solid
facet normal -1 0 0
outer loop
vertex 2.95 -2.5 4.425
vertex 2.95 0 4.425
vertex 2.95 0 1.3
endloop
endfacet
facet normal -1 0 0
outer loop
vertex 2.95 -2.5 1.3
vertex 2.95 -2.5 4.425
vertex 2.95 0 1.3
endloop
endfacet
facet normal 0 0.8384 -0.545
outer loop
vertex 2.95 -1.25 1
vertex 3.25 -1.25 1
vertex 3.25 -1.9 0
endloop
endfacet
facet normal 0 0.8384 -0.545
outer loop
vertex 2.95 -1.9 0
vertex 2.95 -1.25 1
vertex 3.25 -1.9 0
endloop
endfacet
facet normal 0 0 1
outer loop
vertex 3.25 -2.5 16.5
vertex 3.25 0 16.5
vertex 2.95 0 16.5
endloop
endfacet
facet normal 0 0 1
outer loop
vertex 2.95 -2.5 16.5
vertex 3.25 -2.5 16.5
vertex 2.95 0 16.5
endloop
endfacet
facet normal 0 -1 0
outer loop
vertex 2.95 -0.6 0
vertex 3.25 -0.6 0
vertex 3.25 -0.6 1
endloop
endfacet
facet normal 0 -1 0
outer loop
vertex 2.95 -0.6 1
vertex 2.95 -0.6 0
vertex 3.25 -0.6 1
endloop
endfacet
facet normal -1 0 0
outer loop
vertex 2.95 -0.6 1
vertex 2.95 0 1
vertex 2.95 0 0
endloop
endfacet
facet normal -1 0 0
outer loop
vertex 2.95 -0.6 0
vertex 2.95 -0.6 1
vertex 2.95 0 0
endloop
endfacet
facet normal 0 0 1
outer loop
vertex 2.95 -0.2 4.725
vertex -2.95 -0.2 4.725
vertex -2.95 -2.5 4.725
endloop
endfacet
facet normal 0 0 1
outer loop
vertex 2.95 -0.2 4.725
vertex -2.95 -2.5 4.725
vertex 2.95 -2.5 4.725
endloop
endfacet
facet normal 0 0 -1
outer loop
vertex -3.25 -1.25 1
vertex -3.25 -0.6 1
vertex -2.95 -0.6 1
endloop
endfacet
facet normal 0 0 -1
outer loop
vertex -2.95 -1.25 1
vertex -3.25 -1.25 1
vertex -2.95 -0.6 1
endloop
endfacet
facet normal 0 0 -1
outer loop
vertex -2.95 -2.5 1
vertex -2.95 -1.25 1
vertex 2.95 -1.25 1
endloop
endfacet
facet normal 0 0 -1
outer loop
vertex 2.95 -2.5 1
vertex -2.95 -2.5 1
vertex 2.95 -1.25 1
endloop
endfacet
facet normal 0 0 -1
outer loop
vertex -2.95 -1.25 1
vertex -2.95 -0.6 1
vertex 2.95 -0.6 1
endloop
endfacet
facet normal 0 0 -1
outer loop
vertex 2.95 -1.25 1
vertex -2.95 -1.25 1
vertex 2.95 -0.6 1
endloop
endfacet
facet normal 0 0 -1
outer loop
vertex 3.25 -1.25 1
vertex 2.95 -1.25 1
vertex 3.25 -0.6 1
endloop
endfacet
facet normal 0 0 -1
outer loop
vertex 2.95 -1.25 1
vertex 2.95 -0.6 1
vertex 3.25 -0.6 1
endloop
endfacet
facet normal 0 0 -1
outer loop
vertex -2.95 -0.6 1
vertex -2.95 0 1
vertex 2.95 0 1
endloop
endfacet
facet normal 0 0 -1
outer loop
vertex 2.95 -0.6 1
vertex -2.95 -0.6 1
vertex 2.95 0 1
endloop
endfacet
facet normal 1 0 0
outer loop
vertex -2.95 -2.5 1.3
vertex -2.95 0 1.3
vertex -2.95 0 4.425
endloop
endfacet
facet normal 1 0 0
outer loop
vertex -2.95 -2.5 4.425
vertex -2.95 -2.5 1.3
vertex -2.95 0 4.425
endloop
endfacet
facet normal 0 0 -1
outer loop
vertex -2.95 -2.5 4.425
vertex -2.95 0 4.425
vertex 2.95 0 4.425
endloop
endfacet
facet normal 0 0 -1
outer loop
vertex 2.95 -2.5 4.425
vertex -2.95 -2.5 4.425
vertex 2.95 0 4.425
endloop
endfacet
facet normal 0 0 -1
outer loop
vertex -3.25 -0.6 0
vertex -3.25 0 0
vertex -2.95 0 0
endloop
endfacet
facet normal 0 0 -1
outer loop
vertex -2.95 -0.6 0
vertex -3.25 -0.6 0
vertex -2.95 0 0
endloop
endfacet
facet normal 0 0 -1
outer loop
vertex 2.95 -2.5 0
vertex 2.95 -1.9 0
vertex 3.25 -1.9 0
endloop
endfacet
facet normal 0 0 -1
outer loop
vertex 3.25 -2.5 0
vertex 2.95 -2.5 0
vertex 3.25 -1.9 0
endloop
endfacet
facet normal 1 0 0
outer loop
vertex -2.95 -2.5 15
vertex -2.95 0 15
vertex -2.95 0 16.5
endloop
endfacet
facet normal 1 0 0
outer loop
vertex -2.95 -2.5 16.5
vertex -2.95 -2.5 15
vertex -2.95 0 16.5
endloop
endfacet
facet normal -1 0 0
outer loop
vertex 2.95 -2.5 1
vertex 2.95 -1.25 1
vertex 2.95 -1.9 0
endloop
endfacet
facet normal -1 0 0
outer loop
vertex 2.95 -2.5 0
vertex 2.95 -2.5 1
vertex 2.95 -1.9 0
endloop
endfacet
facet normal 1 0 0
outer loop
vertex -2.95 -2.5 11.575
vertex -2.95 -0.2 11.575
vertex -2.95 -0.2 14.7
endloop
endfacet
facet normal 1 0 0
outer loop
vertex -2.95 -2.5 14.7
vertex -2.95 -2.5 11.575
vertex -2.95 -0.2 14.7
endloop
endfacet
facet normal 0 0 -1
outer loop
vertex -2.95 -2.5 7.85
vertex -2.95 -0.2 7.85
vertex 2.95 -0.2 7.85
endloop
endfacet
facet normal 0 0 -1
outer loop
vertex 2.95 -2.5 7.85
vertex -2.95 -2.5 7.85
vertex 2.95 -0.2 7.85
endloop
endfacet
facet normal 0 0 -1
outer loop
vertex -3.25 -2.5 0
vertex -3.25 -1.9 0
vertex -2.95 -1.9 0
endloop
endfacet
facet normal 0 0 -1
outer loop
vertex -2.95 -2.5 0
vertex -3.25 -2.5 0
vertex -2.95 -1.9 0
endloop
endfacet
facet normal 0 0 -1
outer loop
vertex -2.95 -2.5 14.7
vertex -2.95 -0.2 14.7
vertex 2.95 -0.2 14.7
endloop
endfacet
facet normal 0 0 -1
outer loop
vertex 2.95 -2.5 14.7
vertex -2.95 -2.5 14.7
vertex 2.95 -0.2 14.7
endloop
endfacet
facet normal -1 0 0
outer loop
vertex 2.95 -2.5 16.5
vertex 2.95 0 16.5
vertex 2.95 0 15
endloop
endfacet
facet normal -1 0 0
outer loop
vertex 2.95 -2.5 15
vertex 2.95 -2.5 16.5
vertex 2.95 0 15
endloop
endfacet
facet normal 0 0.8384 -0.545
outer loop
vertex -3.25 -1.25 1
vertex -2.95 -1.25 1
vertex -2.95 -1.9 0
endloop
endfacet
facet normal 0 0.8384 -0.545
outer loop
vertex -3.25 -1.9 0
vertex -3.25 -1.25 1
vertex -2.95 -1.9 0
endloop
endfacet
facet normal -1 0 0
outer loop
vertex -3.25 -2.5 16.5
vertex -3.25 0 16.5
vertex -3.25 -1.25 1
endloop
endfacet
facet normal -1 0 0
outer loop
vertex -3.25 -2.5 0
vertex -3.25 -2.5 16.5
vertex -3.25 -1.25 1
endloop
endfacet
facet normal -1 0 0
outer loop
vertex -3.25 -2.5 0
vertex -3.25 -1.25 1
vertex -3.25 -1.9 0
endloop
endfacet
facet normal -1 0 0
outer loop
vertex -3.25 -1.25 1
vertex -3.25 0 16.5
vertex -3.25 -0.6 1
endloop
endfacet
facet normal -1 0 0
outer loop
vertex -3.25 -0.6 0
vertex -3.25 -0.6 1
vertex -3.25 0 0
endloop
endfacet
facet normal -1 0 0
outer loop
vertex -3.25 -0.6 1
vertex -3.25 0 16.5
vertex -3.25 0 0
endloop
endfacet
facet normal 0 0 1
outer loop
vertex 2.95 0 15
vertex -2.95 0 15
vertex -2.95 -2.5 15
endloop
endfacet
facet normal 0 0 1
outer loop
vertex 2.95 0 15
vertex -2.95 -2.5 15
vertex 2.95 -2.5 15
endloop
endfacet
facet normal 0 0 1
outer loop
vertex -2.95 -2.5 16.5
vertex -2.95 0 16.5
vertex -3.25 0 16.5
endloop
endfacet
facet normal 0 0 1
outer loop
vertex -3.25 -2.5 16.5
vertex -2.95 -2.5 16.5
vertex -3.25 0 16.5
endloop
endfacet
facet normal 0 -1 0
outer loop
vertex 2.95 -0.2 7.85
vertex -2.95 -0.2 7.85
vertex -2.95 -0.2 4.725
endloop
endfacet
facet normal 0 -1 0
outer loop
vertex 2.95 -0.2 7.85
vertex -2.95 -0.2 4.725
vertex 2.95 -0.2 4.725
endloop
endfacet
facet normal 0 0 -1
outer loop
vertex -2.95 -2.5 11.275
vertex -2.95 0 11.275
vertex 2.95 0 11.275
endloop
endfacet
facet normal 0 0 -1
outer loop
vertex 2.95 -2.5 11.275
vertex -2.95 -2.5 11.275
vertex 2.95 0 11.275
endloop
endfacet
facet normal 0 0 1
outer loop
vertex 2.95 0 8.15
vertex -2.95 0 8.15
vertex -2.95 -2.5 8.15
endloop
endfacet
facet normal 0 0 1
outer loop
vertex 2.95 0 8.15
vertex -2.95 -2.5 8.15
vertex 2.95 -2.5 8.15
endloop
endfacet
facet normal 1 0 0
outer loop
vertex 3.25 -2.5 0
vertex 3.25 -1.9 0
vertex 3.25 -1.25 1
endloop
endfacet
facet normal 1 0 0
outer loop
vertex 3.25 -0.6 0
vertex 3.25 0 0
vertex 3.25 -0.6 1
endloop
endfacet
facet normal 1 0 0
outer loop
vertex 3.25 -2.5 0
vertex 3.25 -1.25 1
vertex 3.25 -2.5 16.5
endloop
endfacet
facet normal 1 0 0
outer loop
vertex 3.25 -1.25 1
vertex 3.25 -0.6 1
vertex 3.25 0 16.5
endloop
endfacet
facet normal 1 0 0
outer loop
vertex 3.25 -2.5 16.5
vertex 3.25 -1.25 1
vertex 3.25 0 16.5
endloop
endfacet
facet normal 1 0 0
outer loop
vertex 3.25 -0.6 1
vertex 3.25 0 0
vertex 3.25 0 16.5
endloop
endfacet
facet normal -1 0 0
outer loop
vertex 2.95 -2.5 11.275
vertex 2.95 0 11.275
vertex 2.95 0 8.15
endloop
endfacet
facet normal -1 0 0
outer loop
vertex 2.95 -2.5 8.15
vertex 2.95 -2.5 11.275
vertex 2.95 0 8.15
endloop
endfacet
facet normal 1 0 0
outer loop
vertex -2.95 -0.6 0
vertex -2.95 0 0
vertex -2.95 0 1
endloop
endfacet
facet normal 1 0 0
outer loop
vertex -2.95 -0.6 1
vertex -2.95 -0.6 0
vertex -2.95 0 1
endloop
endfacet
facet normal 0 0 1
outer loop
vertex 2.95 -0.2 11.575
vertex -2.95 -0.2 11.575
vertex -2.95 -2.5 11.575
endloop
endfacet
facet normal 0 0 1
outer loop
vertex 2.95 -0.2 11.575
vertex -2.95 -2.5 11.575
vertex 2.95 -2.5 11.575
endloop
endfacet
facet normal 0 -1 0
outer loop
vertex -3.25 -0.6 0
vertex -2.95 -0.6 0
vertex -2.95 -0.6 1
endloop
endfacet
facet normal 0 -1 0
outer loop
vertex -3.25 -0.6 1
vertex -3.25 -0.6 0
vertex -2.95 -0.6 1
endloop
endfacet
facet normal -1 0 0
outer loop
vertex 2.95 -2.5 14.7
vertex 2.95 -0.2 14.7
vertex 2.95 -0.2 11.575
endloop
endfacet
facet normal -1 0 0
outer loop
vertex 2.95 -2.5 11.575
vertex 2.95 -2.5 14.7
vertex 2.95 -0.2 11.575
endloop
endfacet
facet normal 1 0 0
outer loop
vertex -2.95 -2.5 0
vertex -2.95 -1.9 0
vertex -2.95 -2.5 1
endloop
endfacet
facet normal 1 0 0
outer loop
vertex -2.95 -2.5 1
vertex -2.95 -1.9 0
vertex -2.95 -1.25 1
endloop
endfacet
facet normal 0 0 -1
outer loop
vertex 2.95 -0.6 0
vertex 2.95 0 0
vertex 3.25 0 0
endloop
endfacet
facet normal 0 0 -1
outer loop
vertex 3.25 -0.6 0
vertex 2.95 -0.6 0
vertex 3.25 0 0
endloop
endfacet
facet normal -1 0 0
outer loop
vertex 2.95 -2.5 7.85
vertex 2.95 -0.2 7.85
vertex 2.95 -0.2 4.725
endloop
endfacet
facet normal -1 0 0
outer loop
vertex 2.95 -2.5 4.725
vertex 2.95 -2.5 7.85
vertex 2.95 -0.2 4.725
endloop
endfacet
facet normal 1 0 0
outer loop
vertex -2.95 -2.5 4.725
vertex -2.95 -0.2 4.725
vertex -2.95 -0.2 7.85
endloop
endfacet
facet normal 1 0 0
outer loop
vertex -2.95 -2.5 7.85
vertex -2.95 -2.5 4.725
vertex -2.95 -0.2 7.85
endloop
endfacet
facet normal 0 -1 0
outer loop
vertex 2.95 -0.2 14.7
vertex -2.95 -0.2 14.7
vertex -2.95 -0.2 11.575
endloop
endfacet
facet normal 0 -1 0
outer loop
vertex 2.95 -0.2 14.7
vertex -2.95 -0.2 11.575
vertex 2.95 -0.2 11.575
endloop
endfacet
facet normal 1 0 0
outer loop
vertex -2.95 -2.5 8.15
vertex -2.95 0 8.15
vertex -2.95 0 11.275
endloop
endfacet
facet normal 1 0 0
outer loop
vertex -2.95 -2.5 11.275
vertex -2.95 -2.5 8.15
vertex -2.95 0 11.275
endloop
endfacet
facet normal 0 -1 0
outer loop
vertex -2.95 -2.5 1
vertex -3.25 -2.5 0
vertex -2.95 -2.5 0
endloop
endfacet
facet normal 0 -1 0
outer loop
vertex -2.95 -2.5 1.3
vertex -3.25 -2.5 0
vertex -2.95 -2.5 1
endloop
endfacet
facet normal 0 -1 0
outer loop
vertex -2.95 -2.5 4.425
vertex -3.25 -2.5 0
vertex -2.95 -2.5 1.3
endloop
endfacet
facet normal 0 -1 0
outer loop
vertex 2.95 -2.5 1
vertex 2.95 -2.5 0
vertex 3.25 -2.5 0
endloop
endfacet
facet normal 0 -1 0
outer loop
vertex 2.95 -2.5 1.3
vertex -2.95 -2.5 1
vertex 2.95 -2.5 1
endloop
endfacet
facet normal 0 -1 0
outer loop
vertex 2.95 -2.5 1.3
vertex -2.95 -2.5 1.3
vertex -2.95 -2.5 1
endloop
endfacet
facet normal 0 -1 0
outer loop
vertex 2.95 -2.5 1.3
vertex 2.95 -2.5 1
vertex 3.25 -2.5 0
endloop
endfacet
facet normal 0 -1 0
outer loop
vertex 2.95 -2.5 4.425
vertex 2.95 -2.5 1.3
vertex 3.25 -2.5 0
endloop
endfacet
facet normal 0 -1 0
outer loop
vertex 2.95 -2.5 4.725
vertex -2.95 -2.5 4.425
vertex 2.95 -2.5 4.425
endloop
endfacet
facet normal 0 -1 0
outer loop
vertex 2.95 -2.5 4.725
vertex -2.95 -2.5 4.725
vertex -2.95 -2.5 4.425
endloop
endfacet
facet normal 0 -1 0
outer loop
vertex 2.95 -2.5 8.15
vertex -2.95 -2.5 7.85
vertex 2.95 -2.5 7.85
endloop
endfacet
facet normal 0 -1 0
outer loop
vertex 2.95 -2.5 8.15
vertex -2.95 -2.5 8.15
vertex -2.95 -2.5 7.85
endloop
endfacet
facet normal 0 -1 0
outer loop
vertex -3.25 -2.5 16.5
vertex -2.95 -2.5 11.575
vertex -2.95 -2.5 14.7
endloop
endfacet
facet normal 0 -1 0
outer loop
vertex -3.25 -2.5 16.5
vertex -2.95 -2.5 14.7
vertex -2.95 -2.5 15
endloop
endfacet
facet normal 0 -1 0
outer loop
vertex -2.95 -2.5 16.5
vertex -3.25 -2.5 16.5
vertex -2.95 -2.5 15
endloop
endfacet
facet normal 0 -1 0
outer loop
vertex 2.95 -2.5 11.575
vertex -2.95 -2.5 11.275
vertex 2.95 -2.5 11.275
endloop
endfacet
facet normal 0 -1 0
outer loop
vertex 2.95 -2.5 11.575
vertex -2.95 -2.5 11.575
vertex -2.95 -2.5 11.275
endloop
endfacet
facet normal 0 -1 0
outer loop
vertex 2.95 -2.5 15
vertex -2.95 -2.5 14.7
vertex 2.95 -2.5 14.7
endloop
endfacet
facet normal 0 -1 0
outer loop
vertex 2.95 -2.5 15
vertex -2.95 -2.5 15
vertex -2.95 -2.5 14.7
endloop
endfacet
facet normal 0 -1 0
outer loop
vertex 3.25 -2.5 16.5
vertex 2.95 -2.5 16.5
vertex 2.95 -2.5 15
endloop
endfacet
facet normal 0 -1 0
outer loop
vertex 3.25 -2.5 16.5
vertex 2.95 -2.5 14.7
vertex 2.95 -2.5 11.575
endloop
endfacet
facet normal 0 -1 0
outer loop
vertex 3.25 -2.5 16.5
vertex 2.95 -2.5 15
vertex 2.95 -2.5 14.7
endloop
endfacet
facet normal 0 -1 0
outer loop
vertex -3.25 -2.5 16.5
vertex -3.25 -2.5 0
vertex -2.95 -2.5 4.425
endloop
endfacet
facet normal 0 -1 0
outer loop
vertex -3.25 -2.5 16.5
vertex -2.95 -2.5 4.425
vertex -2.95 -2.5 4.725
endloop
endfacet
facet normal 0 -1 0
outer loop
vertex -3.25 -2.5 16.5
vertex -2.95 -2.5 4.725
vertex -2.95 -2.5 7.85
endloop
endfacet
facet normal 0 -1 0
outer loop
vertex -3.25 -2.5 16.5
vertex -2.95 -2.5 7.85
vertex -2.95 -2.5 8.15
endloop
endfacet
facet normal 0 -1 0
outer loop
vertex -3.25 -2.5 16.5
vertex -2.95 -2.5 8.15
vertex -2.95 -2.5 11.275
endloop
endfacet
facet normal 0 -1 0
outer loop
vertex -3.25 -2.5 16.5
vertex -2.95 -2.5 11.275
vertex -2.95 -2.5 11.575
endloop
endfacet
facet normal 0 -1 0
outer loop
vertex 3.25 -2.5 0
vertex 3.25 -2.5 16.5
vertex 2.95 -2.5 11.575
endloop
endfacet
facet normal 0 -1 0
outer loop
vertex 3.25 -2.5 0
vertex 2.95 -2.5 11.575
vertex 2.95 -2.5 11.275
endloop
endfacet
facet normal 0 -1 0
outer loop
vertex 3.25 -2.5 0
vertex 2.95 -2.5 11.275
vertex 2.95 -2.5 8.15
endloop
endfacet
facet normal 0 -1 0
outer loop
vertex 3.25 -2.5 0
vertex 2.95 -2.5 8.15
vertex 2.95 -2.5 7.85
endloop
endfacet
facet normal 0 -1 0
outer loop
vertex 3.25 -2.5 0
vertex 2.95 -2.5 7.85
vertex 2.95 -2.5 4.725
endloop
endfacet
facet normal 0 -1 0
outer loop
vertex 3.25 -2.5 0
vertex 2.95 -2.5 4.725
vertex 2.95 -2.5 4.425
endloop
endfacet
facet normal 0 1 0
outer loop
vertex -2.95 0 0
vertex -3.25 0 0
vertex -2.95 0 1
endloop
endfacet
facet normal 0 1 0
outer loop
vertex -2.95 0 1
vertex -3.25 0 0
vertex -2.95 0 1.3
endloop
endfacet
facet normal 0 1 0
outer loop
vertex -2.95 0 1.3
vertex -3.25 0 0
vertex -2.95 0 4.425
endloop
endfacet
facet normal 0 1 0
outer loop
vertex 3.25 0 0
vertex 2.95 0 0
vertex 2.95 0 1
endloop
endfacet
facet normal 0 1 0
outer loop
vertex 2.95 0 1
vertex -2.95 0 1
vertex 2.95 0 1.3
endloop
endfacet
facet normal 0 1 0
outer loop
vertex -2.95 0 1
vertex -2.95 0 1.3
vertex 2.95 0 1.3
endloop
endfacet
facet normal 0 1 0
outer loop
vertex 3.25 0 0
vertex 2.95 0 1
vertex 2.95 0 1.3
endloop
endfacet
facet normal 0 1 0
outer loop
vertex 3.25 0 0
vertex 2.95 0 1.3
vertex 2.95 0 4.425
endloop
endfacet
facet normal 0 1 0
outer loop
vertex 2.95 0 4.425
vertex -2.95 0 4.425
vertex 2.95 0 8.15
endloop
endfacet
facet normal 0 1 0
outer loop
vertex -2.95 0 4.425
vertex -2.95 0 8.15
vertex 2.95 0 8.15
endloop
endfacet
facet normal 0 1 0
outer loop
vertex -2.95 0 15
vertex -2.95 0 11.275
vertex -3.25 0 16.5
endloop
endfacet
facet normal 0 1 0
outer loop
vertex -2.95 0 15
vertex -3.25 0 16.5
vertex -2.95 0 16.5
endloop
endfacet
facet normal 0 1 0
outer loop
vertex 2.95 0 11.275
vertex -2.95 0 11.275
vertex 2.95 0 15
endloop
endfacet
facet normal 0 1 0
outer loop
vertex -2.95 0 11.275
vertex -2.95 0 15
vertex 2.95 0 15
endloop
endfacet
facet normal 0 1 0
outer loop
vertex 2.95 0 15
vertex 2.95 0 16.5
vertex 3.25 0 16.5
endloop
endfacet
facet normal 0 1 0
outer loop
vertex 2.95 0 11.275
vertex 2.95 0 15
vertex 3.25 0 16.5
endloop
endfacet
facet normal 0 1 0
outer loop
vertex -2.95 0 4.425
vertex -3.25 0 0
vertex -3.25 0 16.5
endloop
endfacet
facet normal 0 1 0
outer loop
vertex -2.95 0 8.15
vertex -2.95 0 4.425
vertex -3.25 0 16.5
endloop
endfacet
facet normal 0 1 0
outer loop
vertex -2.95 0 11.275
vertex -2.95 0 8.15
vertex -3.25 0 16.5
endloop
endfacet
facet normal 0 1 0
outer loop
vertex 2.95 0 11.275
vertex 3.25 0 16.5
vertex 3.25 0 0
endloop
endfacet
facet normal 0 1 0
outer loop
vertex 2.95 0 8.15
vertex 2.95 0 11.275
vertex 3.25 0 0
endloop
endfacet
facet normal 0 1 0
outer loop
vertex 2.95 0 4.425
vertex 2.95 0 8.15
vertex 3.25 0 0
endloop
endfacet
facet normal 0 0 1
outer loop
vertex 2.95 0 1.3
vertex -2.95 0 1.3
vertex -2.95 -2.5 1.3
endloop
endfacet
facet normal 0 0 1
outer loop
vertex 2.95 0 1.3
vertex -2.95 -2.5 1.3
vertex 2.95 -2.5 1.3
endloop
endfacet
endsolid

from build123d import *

# Parameters (mm, degrees)
F0_W     = 5.9
F0_H     = 0.3
F1_DEPTH = 2.5
F0_H_2   = 3.125
F2_DEPTH = 0.2
F4_DEPTH = 6.501


with BuildPart() as f1:
    # F0 (on Front) → F1 (new body)
    with BuildSketch(Plane.XZ):
        Polygon((-3.25, 16.5), (-3.25, 0), (-2.95, 0), (-2.95, 1), (-2.95, 1.3), (-2.95, 4.425), (-2.95, 4.725), (-2.95, 7.85), (-2.95, 8.15), (-2.95, 11.275), (-2.95, 11.575), (-2.95, 14.7), (-2.95, 15), (-2.95, 16.5), align=None)
        Polygon((2.95, 1), (2.95, 0), (3.25, 0), (3.25, 16.5), (2.95, 16.5), (2.95, 15), (2.95, 14.7), (2.95, 11.575), (2.95, 11.275), (2.95, 8.15), (2.95, 7.85), (2.95, 4.725), (2.95, 4.425), (2.95, 1.3), align=None)
        with Locations((0, 14.85)):
            Rectangle(F0_W, F0_H)
        with Locations((0, 11.425)):
            Rectangle(F0_W, F0_H)
        with Locations((0, 8)):
            Rectangle(F0_W, F0_H)
        with Locations((0, 4.575)):
            Rectangle(F0_W, F0_H)
        with Locations((0, 1.15)):
            Rectangle(F0_W, F0_H)
    extrude(amount=F1_DEPTH)

    # F0 (on Front) → F2 (join)
    with BuildSketch(Plane.XZ):
        with Locations((0, 13.1375)):
            Rectangle(F0_W, F0_H_2)
        with Locations((0, 6.2875)):
            Rectangle(F0_W, F0_H_2)
    extrude(amount=F2_DEPTH)

    # F3 (on face) → F4 (cut, through all)
    with BuildSketch(Plane.YZ.offset(3.25)):
        Polygon((-1.9, 0), (-0.6, 0), (-0.6, 1), (-1.25, 1), align=None)
    extrude(amount=-F4_DEPTH, mode=Mode.SUBTRACT)


solid = f1.part
